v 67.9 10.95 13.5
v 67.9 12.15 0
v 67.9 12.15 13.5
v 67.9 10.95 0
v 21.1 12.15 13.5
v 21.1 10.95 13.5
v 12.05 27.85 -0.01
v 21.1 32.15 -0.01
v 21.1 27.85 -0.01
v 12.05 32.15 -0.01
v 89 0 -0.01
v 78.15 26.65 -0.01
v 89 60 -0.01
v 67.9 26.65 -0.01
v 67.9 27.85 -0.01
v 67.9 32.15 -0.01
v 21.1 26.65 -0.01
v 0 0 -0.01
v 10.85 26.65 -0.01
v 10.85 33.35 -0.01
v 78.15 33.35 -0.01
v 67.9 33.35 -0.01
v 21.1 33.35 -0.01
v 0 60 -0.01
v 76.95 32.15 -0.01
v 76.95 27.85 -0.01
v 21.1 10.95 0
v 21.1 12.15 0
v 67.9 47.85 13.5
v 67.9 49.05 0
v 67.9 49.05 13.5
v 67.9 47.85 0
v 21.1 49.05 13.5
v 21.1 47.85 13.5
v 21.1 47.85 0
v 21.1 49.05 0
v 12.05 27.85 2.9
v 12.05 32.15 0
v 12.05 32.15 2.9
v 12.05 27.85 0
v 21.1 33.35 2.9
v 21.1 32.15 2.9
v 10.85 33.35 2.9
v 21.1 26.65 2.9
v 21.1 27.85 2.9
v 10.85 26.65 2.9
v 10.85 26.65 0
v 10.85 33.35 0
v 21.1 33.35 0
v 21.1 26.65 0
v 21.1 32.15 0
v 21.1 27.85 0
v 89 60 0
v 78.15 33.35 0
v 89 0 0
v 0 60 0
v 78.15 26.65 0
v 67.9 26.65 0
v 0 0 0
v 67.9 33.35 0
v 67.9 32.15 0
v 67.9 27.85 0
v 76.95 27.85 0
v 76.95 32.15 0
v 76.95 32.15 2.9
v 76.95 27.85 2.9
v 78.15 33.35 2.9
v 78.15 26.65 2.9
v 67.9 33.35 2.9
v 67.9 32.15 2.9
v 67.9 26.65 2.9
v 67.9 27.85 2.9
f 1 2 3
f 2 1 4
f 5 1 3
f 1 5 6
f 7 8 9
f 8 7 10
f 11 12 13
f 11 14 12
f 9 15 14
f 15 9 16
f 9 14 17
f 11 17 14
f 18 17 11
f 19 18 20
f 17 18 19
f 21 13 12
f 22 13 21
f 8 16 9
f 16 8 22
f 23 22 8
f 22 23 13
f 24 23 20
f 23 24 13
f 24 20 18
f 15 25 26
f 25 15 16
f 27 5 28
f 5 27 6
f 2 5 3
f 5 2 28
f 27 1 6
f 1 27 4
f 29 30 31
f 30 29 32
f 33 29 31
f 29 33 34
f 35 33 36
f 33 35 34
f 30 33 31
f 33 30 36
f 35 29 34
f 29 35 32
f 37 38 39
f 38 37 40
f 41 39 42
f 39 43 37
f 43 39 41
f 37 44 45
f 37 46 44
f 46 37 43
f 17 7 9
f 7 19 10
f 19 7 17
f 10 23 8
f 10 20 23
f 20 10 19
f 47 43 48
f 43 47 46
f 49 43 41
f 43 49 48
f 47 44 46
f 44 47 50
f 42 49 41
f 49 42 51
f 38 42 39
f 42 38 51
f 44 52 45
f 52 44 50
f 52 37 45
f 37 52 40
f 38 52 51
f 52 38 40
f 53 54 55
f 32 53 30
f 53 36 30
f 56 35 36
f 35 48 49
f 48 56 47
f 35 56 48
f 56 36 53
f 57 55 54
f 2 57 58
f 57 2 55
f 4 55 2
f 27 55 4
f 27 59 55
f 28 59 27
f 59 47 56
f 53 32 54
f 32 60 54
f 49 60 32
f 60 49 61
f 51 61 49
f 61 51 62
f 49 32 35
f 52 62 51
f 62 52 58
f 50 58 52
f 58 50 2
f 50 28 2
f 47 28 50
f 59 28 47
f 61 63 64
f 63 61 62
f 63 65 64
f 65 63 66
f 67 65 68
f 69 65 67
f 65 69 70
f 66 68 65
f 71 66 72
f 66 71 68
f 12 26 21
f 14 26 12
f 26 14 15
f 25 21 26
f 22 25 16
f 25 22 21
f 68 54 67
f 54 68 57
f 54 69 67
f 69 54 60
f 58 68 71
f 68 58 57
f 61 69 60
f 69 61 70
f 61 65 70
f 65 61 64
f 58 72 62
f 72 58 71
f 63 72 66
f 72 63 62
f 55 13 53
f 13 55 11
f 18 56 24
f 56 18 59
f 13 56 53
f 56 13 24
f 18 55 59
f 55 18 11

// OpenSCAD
// file: ../Base/Rotation.scad
// Fischertechnik Box Foundation
// Geometry Helpers Rotation

include <PlacementOptions.scad>

// getRotatedSpace(space, rotation=NoRotation)
// Rotates the space dependent on the specified rotation

function getRotatedSpace(space, rotation=NoRotation) = [
    (rotation == Rotate90 || rotation == Rotate270) ? space.y : space.x,
    (rotation == Rotate90 || rotation == Rotate270) ? space.x : space.y
];

// Rotates the given space around the fixed left lower corner
// space = the space the children needs as width/depth list [width,depth]
// rotation = 0 Rotate0 degrees, 1 Rotate90 degrees, 2 Rotate180 degrees, 3 Rotate270 degrees (equivalent to -90)

module RotateFix(space, rotation=NoRotation) {
    dy = (rotation == Rotate0 || rotation == Rotate270) ? 0 :
        (rotation == Rotate90) ? space.x :
        space.y;
    dx = (rotation < Rotate180) ? 0 :
        (rotation == Rotate180) ? space.x :
        space.y;
    
    translate([dx, dy, 0])
        rotate([0, 0, rotations[rotation]])
            children();
}
// file: ../Base/Alignment.scad
// Fischertechnik Box Foundation
// Geometry Helpers Alignment

include <PlacementOptions.scad>

// getAlignedX(elementWidth, spaceWidth, align=AlignRight, offset=0)
// Gets the aligned X offset of an element with the given
// width in the given space.
// elementWidth = The width of the element to positon
// spaceWidth = The space where the element should be aligned
// align = 0 AlignLeft, 1 AlignCenter, 2 AlignRight
// offset = an optional offset from the aligned position. When
// aligned left or centered, then positive values are in X direction.
// When aligned right then positive values are in negative X direction.

function getAlignedX(elementWidth, spaceWidth, align=AlignRight, offset=0) =
    (align == AlignLeft) ?
        offset :
        ((align == AlignCenter) ?
        (spaceWidth - elementWidth)/2 + offset :
        spaceWidth - offset - elementWidth);

// getAlignedY(elementDepth, spaceDepth, align=AlignTop, offset=0)
// Gets the aligned Y offset of an element with the given
// depth in the given space.
// elementDepth = The depth of the element to positon
// spaceDepth = The space where the element should be aligned
// align = 0 AlignBottom, 1 AlignCenter, 2 AlignTop
// offset = an optional offset from the aligned position. When
// aligned bottom or centered, then positive values are in Y direction.
// When aligned top then positive values are in negative Y direction.

function getAlignedY(elementDepth, spaceDepth, align=AlignTop, offset=0) =
    (align == AlignBottom) ?
        offset :
        ((align == AlignCenter) ?
        (spaceDepth - elementDepth)/2 + offset :
        spaceDepth - offset - elementDepth);
// file: ../Base/PlacementOptions.scad
// Fischertechnik Box Foundation
// Placement Options

// Alignment
NoAlign = 0;
AlignLeft = 1;
AlignBottom = 2;
AlignCenter = 3;
AlignRight = 4;
AlignTop = 5;

// Element rotation degree steps
rotations = [0, -90, -180, -270];

// Rotation
NoRotation = 0;
Rotate0 = 0;
Rotate90 = 1;
Rotate180 = 2;
Rotate270 = 3;

// Docking (seen from above)
NoDock = -1;
DockLeft = 0;
DockTop = 1;
DockRight = 2;
DockCorner = 2;
DockBottom = 3;

// Web corners
LowerLeft = 0;
UpperLeft = 1;
UpperRight = 2;
LowerRight = 3;

// Web position relative to corner
LeftOfCorner = 0;
RightOfCorner = 1;

// Rails direction
Horizontal = true;
Vertical = false;
// file: ../Base/Boxes.scad
// Fischertechnik Box Foundation
// Pre-designed Boxes

use <Constants.scad>

include <PlacementOptions.scad>

box190Width = 190;
box190Depth = 130;
box130Width = 130;
box130Depth = 95;

// Values are from an original ec3 box
topBottomDifference = 1.5;
outerHeight = 40;
baseThickness = 1.8;
innerHeight = outerHeight - baseThickness;
stackExcess = 5.7;
radius = 3.5;
wallThickness = 1.5;
tolerance = 0.2;

boxWallThickness = wallThickness;
boxBaseThickness = baseThickness;
boxWebWidth = 3.0;

// getBoxWallThickness()
// Gets the wall thickness of a Fischertechnik Box
function getBoxWallThickness() = boxWallThickness;

// getBoxUsageHeight(height = 38.2)
// Gets the usable height of a Fischertechnik box
// height = Outer height of the box from the bottom to the upper edge.
function getBoxUsageHeight(height = outerHeight) = height - baseThickness - stackExcess;

// getBoxInnerHeight()
// Gets the inner height of a Fischertechnik box, including the stack excess
function getBoxInnerHeight() = innerHeight;

// getBoxBaseThickness()
// Gets the thickness of the Fischertechnik box base.
function getBoxBaseThickness() = boxBaseThickness;

// getBoxWebWidth()
// Gets the width of a box web
function getBoxWebWidth() = boxWebWidth;

// getBox190Space()
// Gets the usable inner space of a Box 190 as an x/y-list
function getBox190Space() = [
    box190Width - 2*getBoxWallThickness() - topBottomDifference, 
    box190Depth - 2*getBoxWallThickness() - topBottomDifference ];

// RoundedCornerPlate(width, depth, height, radius)
// Creates a body plate with rounded corners for a box. Used
// also to create the complete box with the hull module.
// width = Width of the plate
// depth = depth of the plate 
// height = thickness of the plate
// radius = radius of the rounded corner
module RoundedCornerPlate(width, depth, height, radius) {
    translate([radius, radius])
    hull() {
        w = width-2*radius;
        d = depth-2*radius;
        cube([w, d, height]);
        cylinder(height, r=radius, $fn=getFragments());
        translate([w, 0])
            cylinder(height, r=radius, $fn=getFragments());
        translate([w, d])
            cylinder(height, r=radius, $fn=getFragments());
        translate([0, d])
            cylinder(height, r=radius, $fn=getFragments());
    }
}

// BoxBase(width, depth)
// Creates an empty stackable Fischertechnik compatible box
// width = Outer width of the box (190, 130, ...)
// depth = Outer depth of the box (130, 95, ...)

module BoxBase(width, depth, height=outerHeight) {    
    thinPlate = 0.01;

    innerHeight = height - baseThickness;    
    
    module Body(tolerance=tolerance) {
        hull() {
            // Bottom with tolerance to fit into the original boxes when stacked
            translate([-wallThickness+tolerance, -wallThickness+tolerance, -baseThickness])
                RoundedCornerPlate(width-topBottomDifference-2*tolerance, depth-topBottomDifference-2*tolerance, thinPlate, radius);
            
            // Top
            translate([-wallThickness-topBottomDifference/2, -wallThickness-topBottomDifference/2, innerHeight-thinPlate])
                RoundedCornerPlate(width, depth, thinPlate, radius);
         }
    }

    module Cutoff() {
        hull() {
            coWidth = width - 2*wallThickness;
            coDepth = depth - 2*wallThickness;
            
            // Bottom
            RoundedCornerPlate(coWidth-topBottomDifference, coDepth-topBottomDifference, thinPlate, radius);

            // Top
            translate([-topBottomDifference/2, -topBottomDifference/2, innerHeight+thinPlate]) 
                RoundedCornerPlate(coWidth, coDepth, thinPlate, radius);
        }
    }
    
    difference() {        
        Body();
        Cutoff();
        stackOffset = innerHeight - stackExcess;
        translate([0, 0, stackOffset + baseThickness])
            Body(tolerance=0);
    }
}

// Creates the Fischertechnik empty box 130x190 mm and places it at position 0,0
// 190x130 are the outer sizes, the inner space is slightly smaller. Use getBox190Space() to get the inner sizes.
// The box is positioned that the usable inner space is at the 0,0,0 position.

module Box190() {
    BoxBase(box190Width, box190Depth);
}

// Gets the usable inner space of a Box 130 as an x/y-list
function getBox130Space() = [
    box130Width - 2*getBoxWallThickness() - topBottomDifference, 
    box130Depth - 2*getBoxWallThickness() - topBottomDifference ];

// Creates the Fischertechnik empty box 95x130 mm and places it at position 0,0
// 190x130 are the outer sizes, the inner space is slightly smaller. Use getBox190Space() to get the inner sizes.
// The box is positioned that the usable inner space is at the 0,0,0 position.

module Box130() {
    BoxBase(box130Width, box130Depth);
}

// Creates a web at the specified box walls
// corner 0 = LowerLeft, 1 = UpperLeft, 2 = UpperRight, 3 = LowerRight
// side 0 = LeftOfCorner, 1 = RightOfCorner
// distance = Distance in mm from the corner
// boxSpace = inner width and depth of the box (default: Box 190)
// webWidth = length of the web (default is 3 mms)
// webThickness = thickness of the web (default is 1 mm)
// height = Height of the web (standard is getBoxUsageHeight())
// sink = How much of the web is sunk into the wall

module BoxWeb(
    corner, 
    side, 
    distance, 
    boxSpace=getBox190Space(), 
    webWidth=getBoxWebWidth(), 
    webThickness=1.0, 
    height=getBoxUsageHeight(),
    sink = getBoxWallThickness()/2) {
    width = (corner % 2 == 0) ? 
            (side == LeftOfCorner ? webWidth : webThickness) :
            (side == LeftOfCorner ? webThickness : webWidth);

    depth = (corner % 2 == 0) ? 
            (side == RightOfCorner ? webWidth : webThickness) :
            (side == RightOfCorner ? webThickness : webWidth);
    
    xDiff = corner == LowerLeft ? 
                (side == LeftOfCorner ? -sink : distance) :
            (corner == UpperLeft ?                
                (side == LeftOfCorner ? distance : -sink) :
            (corner == UpperRight ?
                (side == LeftOfCorner ? boxSpace.x-webWidth+sink : boxSpace.x-distance-webThickness) :
                (side == LeftOfCorner ? boxSpace.x-distance-webThickness: boxSpace.x-webWidth+sink)));

    yDiff = corner == LowerLeft ? 
                (side == RightOfCorner ? -sink : distance) :
            (corner == UpperLeft ?
                (side == RightOfCorner ? boxSpace.y-distance-webThickness : boxSpace.y-webWidth+sink) :
            (corner == UpperRight ?
                (side == RightOfCorner ? boxSpace.y-webWidth+sink : boxSpace.y-distance-webThickness) :
                (side == RightOfCorner ? distance : -sink)));
    
    translate([xDiff, yDiff, -getExcess()])
        cube([width, depth, height + 2*getExcess()]);
}
// file: ../Base/Placement.scad
// Fischertechnik Box Foundation
// Geometry Helpers Placement

use <Constants.scad>
use <Alignment.scad>
use <Rotation.scad>
use <Boxes.scad>

include <PlacementOptions.scad>

// Place(x=0, y=0, elementSpace=[0,0], alignX=AlignLeft, alignY=AlignBottom, rotation=Rotate0, boxSpace=getBox190Space())
// Places the child at the specified position
// y = Y-Position. This is a relative position when an X aligment is specified.
// x = X-Position. This is a relative position when an Y aligment is specified.
// elementSpace = space of the element to be placed [x,y]
// alignX = -1=NoAlign, 0 AlignLeft, 1 AlignCenter, 3 AlignRight (elementSpace and boxSpace required!)
// alignY = -1=NoAlign, 2 AlignBottom, 1 AlignCenter, 4 AlignTop (elementSpace and boxSpace required!)
// rotation = 0 Rotate0 0 degrees, 1 Rotate90 90 degrees, 
// 2 Rotate180 180 degrees, 3 Rotate270 270 degrees (equivalent to -90)
// boxSpace = Inner space of the box where the placement occurs [x,y] - default is Box 190x130 inner space

module Place(x=0, y=0, elementSpace=[0,0], 
  alignX=AlignLeft, alignY=AlignBottom, 
  rotation=NoRotation, boxSpace=getBox190Space()) {

    module Position(x, y, space, rotation=Rotate0) {
        translate([x, y, 0])
            RotateFix(space, rotation)
                children();
    }

    space = getRotatedSpace(elementSpace, rotation);
    alignedX = getAlignedX(space.x, boxSpace.x, alignX, x);
    alignedY = getAlignedY(space.y, boxSpace.y, alignY, y);
    Position(alignedX, alignedY, elementSpace, rotation)
        children();
}

// Center(space=getBox130Space(), elementSpace=[0,0])
// space = Space where the children is centered. For cylinder use centered=true and no elementSpace.
// elementSpace = space of the element to be centered [x,y]

module Center(space=getBox190Space(), elementSpace=[0,0]) {
    Place(elementSpace=elementSpace, boxSpace=space, alignX=AlignCenter, alignY=AlignCenter)
        children();
}

// CenterHorizontal(width=0, y=0, offset=0, space=getBox130Space())
// width = Width of the element to be placed.
// y = Y position of the element
// offset = Offset from the center position (negative will be left of the center)
// space = Space where the element is placed

module CenterHorizontal(width=0, y=0, offset=0, space=getBox190Space()) {
    Place(x=offset, y=y, elementSpace=[width, 0], boxSpace=space, alignX=AlignCenter)
        children(0);
}

// CenterVertical(depth=0, x=0, offset=0, space=getBox130Space())
// depth = Depth of the element to be placed.
// x = X position of the element
// offset = Offset from the center position (negative will be down of the center)
// space = Space where the element is placed

module CenterVertical(depth=0, x=0, offset=0, space=getBox190Space()) {
    Place(x=x, y=offset, elementSpace=[0, depth], boxSpace=space, alignY=AlignCenter)
        children(0);
}

// getIsVertical(align)
// True if the specified alignment needs a vertical orientation for a divider (AlignRight, AlignLeft)

function getIsVertical(align) = (align == AlignRight || align == AlignLeft);

// getIsHorizontal(align)
// True if the specified alignment needs a horizontal orientation for a divider (AlignTop, AlignBottom)

function getIsHorizontal(align) = (align == AlignTop || align == AlignBottom);
// file: ../Base/Constants.scad
// Fischertechnik Box Foundation
// Constants

// Constant values necessary for multiple elements

// Base constants
dividerThickness = 1.2;
excess = 0.01;
fragments = 90;
tolerance = 0.8;

// Gets the thickness of a divider 
function getDividerThickness() = dividerThickness;

// Gets the excess that is used to merge walls into each other
function getExcess() = excess;

// Gets amount of fragments of a cylinder
function getFragments() = fragments;

// Gets the inner tolerance of a frame to each side
function getTolerance() = tolerance;


// Fischertechnik specific constants
axisDiameter = 4;
axisBottomDiameter = axisDiameter + 1;
axisTolerance = 0.2;
axisLockingLength = 8;

// Gets axis diameter of Fischertechnik axis
function getAxisDiameter() = axisDiameter;

// Gets axis diameter tolerance (subtracted for element axis)
function getAxisTolerance() = axisTolerance;

// Gets the axis diameter for standing axis
function getStandAxisDiameter() = getAxisDiameter() - getAxisTolerance();

// Gets axis bottom diameter for thicker part at the bottom
function getAxisBottomDiameter() = axisBottomDiameter;

// Gets the lengthh of the locking part of a locking axis
function getAxisLockingLength() = axisLockingLength;

// Studs

studHeight = 2.5;
studTolerance = 0.2;

// gets the height of a connecting stud
function getStudHeight() = studHeight;

// gets the connecting stud height tolerance
function getStudTolerance() = studTolerance;

// Dockable Frame with Edge

standardEdgeDistance = 2.5;
standardWebDistance = 11.5;
standardCornerLength = 15;

// gets the standard distance to the wall of the box for dockable frames with webs
function getStandardEdgeDistance() = standardEdgeDistance;

// gets the standard distance of each web to the corner of the dockable frame
function getStandardWebDistance() = standardWebDistance;

// gets the standard length of the corner walls of a dockable frame
function getStandardCornerLength() = standardCornerLength;

// Tubes

tubeWallFactor = 0.8;

// gets the wall thickness of a tube.
function getTubeWallThickness() = tubeWallFactor * getDividerThickness();

// Small Parts and Divider Frame

smallPartsFrameHeight = 20;

// gets the frame height for docked small parts boxes.
function getSmallPartsFrameHeight() = smallPartsFrameHeight;

// Hubs

hubRingDiameter = 19.5;
hubRingLevelDiameter = 21;

// gets the diameter of a tube matching the inner ring of a wheel
function getHubRingDiameter() = hubRingDiameter;

// gets the diameter of a hub tube with a thicker diameter
function getHubRingLevelDiameter() = hubRingLevelDiameter;

// Struts

strutAddLength = 9.0;
strutDepth = 8.0;

// gets the full length of a strut
function getFullStrutLength(length) = length + strutAddLength;

// gets the radius of the end of a strut
function getStrutEndRadius() = strutAddLength / 2;

// gets the the depth of a strut
function getStrutDepth() = strutDepth;
// main file
// Fischertechnik Box Library
// Complete Bucket Holder
// 37354, 37353, 37355, 38257

use <../Base/Constants.scad>
use <../ModelBase/Simple.scad>
use <../ModelBase/Complex.scad>

/* [Hidden] */
width = 89;
depth = 60;

// getHolderCompleteBucketSpace()
// Gets the space the holder complete bucket needs as width and depth (.x and .y as a list)

function getHolderCompleteBucketSpace() = [width, depth];

// HolderCompleteBucket()
// Holder for complete bucket with three middle and two side parts, 
// and a middle axis.
// 37354, 37353, 37355, 38257

module HolderCompleteBucket() {
    railWidth = 46.8;
    railHeight = 13.5;
    railDistance = 35.7;
    outerStudFrameLength = 10.25;
    innerStudFrameLength = outerStudFrameLength - 3*getDividerThickness();
    innerStudFrameDepth = 4.3;
    outerStudFrameDepth = innerStudFrameDepth + 2*getDividerThickness();
    StudFrameHeight = 2.9;
    
    Space(getHolderCompleteBucketSpace());

    railXOffset = (getHolderCompleteBucketSpace().x - railWidth) / 2;
    railYOffset1 = (getHolderCompleteBucketSpace().y - railDistance) / 2 - getDividerThickness();
    railYOffset2 = railYOffset1 + railDistance + getDividerThickness();    
    
    translate([railXOffset, 0, 0]) {
        translate([0, railYOffset1, 0])
            Wall([railWidth, getDividerThickness(), railHeight]);
        translate([0, railYOffset2, 0])
            Wall([railWidth, getDividerThickness(), railHeight]);
    }
    
    midYOffset = (getHolderCompleteBucketSpace().y - outerStudFrameDepth) / 2;
    
    railXOffset1 = railXOffset - outerStudFrameLength;
    translate([railXOffset1, midYOffset, 0])
        DockableFrame([innerStudFrameLength, innerStudFrameDepth, StudFrameHeight], wallRight=false, tolerance=0);
    
    railXOffset2 = outerStudFrameLength + railXOffset + railWidth;
    translate([railXOffset2, midYOffset, 0])
        mirror([1,0,0])
            DockableFrame([innerStudFrameLength, innerStudFrameDepth, StudFrameHeight], wallRight=false, tolerance=0);
}

// Test
color("lightgray")
HolderCompleteBucket();
